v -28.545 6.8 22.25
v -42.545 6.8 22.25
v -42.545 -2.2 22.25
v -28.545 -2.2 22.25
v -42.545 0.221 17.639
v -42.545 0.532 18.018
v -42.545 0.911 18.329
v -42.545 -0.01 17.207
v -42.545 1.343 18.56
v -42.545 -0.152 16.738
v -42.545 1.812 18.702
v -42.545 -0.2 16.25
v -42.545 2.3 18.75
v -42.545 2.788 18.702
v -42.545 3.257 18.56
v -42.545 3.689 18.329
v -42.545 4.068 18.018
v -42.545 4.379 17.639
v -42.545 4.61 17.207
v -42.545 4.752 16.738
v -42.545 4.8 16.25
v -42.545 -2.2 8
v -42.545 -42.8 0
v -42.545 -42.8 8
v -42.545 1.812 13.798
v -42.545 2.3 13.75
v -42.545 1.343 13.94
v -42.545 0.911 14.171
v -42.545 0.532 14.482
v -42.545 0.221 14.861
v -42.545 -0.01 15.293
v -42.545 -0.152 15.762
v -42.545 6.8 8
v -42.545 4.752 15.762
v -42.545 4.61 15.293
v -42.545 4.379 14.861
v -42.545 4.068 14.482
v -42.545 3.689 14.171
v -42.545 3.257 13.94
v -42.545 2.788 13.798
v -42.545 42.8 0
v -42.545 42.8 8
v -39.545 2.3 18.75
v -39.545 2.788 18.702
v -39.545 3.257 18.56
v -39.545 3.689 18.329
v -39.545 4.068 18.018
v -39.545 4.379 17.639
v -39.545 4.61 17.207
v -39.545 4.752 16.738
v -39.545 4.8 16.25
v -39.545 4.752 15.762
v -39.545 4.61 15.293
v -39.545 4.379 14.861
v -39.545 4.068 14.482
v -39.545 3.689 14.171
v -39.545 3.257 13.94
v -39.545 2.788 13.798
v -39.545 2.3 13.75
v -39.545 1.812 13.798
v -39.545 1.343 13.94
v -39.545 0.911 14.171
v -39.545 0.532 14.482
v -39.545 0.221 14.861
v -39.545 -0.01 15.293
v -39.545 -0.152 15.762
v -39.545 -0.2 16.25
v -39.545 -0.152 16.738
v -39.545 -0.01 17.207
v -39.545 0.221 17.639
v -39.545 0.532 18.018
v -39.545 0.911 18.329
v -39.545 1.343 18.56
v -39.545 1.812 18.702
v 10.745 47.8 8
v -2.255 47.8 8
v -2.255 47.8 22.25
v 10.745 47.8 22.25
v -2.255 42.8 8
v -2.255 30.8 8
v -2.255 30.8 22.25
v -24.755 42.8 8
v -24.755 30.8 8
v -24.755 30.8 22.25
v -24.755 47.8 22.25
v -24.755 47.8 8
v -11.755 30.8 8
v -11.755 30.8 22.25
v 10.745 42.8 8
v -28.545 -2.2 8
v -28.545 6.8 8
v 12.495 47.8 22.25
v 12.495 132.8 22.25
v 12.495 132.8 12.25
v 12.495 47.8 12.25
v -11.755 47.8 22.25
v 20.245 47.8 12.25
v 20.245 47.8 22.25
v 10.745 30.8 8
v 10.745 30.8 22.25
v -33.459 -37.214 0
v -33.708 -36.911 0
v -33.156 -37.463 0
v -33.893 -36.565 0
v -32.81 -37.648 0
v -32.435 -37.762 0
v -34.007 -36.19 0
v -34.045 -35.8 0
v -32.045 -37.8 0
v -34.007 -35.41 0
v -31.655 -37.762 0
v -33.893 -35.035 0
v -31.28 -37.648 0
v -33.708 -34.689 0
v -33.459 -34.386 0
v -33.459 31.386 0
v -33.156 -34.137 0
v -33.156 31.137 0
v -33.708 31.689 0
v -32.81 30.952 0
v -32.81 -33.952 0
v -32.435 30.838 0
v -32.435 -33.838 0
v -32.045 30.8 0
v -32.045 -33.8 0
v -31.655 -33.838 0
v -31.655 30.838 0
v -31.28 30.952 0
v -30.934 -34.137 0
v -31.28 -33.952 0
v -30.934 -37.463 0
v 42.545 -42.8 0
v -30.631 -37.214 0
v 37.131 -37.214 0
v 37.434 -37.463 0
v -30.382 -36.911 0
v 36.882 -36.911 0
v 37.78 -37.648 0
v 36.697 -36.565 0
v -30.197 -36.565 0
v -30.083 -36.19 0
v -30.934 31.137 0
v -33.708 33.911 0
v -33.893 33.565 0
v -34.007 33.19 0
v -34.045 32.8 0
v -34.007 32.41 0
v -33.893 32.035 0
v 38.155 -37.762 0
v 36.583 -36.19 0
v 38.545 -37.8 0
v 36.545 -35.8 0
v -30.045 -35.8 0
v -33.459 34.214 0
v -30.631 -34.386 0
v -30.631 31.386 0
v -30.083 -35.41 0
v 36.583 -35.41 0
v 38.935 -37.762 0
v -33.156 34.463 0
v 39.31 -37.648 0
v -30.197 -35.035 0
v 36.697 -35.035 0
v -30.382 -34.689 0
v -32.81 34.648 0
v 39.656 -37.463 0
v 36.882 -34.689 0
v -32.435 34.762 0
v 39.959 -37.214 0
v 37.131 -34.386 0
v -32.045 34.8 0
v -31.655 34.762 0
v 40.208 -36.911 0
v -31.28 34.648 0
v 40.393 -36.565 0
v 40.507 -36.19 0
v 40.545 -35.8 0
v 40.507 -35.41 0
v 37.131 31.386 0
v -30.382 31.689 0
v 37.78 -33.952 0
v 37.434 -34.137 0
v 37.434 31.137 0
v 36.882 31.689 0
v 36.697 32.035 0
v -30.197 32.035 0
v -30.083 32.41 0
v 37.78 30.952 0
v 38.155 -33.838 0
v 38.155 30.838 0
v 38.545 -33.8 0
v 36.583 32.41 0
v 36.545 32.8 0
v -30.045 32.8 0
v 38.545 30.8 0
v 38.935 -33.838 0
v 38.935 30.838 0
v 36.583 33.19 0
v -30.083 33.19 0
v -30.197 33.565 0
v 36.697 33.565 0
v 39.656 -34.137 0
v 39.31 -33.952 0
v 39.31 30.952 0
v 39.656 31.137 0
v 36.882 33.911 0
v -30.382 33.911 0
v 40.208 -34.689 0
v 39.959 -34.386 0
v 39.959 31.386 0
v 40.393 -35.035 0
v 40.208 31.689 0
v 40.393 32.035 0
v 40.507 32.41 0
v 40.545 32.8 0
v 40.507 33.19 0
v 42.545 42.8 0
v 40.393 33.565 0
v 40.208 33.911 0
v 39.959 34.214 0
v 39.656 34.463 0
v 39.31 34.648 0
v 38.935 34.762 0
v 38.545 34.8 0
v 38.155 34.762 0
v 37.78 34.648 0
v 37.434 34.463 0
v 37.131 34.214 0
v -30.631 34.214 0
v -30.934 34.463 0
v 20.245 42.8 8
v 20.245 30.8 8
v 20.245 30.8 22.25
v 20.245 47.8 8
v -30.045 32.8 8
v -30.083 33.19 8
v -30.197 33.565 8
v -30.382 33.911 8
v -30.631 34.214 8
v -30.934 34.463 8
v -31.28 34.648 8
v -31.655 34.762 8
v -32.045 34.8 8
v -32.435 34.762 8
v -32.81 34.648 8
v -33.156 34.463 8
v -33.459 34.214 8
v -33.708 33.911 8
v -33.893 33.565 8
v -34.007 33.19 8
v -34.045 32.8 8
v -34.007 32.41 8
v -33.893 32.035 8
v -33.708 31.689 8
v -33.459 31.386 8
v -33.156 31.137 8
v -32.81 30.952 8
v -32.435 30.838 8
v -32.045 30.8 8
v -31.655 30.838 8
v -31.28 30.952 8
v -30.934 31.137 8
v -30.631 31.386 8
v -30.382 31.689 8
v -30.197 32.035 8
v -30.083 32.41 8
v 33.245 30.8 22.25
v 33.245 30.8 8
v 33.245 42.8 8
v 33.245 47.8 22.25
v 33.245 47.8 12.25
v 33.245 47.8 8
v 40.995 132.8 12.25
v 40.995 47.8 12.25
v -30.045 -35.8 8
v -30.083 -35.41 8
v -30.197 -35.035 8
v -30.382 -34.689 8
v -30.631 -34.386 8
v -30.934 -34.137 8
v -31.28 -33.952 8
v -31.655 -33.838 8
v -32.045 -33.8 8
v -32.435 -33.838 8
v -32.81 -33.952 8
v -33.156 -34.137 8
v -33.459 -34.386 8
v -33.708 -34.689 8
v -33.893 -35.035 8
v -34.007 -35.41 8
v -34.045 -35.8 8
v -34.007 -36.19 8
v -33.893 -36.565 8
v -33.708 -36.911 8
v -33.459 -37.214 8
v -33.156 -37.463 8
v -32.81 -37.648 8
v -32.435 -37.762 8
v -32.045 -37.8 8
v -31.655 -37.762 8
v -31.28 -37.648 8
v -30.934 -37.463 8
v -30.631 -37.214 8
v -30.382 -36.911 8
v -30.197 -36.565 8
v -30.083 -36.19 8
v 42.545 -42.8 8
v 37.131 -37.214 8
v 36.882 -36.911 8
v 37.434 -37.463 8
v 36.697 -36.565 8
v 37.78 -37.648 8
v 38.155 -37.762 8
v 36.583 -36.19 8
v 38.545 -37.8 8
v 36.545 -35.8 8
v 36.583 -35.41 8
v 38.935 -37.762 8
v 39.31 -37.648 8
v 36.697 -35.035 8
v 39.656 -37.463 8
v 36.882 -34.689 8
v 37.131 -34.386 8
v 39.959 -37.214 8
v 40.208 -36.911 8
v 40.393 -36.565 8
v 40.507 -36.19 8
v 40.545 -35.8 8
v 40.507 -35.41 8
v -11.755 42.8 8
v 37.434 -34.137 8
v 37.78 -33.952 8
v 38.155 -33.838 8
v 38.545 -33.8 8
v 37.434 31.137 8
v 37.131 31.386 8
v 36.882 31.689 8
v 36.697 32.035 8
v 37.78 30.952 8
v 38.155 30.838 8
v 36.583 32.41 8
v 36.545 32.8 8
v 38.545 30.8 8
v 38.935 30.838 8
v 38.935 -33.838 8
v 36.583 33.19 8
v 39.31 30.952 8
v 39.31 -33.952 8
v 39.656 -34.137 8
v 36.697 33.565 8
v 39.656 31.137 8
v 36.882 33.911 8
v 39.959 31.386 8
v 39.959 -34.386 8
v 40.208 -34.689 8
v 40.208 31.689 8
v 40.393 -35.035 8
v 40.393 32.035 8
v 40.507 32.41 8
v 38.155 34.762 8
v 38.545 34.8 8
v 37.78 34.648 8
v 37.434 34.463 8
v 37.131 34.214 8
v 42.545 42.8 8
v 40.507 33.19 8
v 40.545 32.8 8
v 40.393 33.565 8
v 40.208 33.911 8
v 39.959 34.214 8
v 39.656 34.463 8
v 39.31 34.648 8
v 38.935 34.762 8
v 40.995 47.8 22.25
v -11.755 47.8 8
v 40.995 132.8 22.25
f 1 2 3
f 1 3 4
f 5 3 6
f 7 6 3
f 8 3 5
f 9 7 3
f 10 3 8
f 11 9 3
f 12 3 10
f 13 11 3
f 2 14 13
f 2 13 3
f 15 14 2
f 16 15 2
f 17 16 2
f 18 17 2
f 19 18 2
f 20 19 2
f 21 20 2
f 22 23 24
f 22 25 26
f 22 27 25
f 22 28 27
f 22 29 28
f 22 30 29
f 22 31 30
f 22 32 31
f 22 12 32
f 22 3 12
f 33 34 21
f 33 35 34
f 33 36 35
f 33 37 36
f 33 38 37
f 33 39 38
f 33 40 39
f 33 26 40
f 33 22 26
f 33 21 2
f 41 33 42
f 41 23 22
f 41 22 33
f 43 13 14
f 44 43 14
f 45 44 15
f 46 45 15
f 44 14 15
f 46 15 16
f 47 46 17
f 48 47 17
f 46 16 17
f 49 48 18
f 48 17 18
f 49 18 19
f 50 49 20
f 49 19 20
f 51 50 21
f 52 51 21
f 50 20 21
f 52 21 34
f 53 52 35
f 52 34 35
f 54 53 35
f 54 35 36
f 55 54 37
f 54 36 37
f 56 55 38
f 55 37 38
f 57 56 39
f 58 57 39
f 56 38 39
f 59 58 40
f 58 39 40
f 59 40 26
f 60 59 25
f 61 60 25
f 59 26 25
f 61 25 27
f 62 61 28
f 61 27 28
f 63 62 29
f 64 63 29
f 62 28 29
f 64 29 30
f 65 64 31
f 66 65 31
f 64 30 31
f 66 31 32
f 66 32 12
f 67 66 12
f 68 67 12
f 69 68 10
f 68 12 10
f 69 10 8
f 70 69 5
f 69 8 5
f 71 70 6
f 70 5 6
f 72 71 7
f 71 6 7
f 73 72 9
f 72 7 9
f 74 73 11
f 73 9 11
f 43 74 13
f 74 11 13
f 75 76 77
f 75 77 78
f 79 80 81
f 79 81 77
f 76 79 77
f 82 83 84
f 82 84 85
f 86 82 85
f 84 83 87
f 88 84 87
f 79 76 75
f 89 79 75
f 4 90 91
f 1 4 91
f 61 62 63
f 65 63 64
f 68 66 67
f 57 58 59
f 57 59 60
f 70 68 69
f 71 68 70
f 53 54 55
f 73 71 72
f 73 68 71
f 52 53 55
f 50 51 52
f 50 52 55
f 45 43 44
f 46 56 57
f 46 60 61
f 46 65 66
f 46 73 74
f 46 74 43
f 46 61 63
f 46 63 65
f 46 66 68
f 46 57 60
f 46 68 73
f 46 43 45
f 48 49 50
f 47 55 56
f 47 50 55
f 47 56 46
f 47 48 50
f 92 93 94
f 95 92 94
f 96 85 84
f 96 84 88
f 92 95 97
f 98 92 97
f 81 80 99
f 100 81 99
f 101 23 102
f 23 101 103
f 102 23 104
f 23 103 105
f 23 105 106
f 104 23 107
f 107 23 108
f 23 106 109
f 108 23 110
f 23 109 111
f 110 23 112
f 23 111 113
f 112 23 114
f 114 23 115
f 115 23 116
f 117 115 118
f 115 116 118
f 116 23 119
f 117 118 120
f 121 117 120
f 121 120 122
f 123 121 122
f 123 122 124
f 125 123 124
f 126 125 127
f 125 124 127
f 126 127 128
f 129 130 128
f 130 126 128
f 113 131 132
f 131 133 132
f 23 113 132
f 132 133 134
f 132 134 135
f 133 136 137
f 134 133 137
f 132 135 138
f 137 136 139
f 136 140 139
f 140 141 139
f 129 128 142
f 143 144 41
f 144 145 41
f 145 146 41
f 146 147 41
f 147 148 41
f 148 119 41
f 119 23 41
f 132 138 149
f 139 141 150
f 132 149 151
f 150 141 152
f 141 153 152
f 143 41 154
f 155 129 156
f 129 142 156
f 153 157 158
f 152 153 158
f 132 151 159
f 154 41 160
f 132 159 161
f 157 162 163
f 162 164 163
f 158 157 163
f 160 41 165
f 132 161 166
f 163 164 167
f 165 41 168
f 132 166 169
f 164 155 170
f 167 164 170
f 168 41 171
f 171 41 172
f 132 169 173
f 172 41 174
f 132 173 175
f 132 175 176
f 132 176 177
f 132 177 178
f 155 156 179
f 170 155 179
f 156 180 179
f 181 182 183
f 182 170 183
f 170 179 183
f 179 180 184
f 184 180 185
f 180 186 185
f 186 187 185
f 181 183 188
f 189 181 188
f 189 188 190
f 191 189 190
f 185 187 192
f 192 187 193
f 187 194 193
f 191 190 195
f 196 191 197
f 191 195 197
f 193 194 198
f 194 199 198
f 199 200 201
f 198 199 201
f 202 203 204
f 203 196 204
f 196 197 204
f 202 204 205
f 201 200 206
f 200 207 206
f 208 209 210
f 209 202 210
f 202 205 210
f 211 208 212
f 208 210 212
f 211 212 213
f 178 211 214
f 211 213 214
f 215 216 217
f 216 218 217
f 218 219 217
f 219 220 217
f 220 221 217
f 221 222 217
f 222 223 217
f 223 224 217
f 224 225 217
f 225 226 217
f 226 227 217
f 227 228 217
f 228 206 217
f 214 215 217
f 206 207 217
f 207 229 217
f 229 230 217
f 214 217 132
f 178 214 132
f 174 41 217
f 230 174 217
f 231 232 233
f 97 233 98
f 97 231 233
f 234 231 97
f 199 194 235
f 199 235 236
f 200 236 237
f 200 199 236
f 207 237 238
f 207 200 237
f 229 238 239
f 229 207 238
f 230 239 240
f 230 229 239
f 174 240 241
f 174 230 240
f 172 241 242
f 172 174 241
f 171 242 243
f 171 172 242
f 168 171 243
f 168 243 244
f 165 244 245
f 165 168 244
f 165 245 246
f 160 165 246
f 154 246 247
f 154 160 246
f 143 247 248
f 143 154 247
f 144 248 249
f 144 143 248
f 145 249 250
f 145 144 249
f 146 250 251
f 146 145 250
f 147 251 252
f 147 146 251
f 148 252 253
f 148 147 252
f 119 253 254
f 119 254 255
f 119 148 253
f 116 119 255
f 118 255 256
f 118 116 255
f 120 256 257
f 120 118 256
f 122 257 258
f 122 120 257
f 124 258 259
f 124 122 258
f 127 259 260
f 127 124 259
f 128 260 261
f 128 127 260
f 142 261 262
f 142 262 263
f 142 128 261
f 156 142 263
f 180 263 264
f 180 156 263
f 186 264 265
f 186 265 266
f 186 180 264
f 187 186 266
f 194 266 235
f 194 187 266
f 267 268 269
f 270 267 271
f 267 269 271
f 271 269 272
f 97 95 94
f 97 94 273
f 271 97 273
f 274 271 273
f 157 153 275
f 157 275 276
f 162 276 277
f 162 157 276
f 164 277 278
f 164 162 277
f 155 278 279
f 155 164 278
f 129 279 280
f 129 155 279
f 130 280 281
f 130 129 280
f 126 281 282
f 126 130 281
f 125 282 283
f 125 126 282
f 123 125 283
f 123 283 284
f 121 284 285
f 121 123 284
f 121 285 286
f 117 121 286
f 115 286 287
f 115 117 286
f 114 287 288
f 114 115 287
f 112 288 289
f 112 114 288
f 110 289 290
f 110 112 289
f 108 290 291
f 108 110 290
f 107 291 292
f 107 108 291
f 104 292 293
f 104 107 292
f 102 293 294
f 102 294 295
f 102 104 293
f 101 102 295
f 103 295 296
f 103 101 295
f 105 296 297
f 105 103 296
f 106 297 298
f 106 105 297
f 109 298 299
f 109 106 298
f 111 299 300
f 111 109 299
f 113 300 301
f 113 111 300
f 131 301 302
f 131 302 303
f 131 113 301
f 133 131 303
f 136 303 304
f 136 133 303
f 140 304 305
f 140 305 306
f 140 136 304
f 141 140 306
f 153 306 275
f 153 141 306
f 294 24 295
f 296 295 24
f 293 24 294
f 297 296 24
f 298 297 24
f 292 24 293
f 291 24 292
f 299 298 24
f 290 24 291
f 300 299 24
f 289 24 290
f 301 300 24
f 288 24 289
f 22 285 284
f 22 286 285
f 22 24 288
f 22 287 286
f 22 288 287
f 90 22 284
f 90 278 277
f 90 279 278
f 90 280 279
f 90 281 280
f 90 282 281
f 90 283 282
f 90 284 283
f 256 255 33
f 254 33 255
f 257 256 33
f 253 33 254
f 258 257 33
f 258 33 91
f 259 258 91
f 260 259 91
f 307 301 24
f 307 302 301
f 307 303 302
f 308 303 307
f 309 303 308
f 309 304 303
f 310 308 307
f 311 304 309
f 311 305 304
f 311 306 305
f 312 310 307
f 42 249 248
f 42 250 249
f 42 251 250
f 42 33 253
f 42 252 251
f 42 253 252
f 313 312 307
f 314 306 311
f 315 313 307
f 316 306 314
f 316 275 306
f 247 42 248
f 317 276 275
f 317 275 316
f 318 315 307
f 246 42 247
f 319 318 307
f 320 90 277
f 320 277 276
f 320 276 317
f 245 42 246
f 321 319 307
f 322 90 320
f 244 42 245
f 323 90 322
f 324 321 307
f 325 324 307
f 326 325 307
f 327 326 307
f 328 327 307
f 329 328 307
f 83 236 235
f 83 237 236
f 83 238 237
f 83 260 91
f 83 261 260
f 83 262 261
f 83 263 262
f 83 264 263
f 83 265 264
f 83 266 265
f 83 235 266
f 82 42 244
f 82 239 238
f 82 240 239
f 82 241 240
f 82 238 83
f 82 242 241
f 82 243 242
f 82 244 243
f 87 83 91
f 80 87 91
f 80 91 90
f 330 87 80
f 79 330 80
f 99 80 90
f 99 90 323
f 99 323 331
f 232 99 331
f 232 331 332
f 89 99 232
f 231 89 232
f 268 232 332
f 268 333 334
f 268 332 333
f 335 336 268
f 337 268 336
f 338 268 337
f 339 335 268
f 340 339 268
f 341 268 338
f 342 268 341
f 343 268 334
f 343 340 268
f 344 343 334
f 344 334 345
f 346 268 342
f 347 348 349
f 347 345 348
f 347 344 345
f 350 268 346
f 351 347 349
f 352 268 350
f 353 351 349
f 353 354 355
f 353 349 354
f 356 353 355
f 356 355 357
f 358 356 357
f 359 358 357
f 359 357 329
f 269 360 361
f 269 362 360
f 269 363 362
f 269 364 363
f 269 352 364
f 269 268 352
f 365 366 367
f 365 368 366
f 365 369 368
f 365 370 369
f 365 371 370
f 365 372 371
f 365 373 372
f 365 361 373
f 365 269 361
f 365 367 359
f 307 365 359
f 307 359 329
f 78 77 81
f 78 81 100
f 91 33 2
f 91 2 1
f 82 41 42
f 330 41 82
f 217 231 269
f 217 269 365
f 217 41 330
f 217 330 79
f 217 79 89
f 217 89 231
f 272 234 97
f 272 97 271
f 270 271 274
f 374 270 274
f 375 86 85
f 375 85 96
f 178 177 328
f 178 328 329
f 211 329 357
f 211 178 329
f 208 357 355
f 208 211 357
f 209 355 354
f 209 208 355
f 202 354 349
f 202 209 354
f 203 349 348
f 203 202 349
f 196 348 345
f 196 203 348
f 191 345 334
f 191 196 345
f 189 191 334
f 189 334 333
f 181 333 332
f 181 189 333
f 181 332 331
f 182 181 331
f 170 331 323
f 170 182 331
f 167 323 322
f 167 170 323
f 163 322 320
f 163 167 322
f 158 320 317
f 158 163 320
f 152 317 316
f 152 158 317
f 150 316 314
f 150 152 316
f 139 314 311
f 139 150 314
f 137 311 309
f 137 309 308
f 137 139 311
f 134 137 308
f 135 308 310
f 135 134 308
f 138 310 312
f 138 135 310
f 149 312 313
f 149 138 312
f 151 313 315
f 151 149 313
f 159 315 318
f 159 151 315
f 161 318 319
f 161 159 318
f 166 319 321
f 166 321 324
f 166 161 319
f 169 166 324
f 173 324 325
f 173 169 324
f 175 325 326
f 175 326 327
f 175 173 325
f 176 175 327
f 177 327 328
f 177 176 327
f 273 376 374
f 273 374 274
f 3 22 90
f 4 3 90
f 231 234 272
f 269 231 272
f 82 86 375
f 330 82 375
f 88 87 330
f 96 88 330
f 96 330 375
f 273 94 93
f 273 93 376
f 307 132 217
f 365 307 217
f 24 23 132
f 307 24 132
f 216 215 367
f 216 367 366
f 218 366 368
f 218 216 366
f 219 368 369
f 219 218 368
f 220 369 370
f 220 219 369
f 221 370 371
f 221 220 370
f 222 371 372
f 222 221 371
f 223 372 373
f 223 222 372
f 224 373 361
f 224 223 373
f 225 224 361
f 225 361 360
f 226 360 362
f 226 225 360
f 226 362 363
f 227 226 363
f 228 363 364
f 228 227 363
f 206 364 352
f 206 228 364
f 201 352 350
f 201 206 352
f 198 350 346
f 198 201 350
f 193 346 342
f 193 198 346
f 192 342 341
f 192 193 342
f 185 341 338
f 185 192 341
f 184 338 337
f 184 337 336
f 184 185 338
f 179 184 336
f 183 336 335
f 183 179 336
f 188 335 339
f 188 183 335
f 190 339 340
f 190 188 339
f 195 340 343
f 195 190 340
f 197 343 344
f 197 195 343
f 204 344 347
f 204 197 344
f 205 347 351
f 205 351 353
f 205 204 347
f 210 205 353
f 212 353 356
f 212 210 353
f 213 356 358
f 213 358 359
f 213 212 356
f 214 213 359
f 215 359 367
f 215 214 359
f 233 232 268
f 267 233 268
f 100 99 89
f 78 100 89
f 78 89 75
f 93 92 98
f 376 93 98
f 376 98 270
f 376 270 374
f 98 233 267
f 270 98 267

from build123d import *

# Parameters (mm, degrees)
SKETCH1_W           = 85.09
SKETCH1_H           = 85.6
SKETCH1_R           = 2
BOSS_EXTRUDE1_DEPTH = 8
SKETCH2_W           = 13
SKETCH2_H           = 17
SKETCH2_W_2         = 14
SKETCH2_H_2         = 9
BOSS_EXTRUDE2_DEPTH = 14.25
SKETCH3_R           = 2.5
CUT_EXTRUDE1_DEPTH  = 3
SKETCH4_W           = 28.5
SKETCH4_H           = 10
BOSS_EXTRUDE3_DEPTH = 85


with BuildPart() as part:
    # Sketch1 → Boss-Extrude1 (new body)
    with BuildSketch(Plane.XY):
        Rectangle(SKETCH1_W, SKETCH1_H)
        with Locations((-32.045, 32.8)):
            Circle(SKETCH1_R, mode=Mode.SUBTRACT)
        with Locations((38.545, 32.8)):
            Circle(SKETCH1_R, mode=Mode.SUBTRACT)
        with Locations((38.545, -35.8)):
            Circle(SKETCH1_R, mode=Mode.SUBTRACT)
        with Locations((-32.045, -35.8)):
            Circle(SKETCH1_R, mode=Mode.SUBTRACT)
    extrude(amount=BOSS_EXTRUDE1_DEPTH)

    # Sketch2 → Boss-Extrude2 (add)
    with BuildSketch(Plane.XY.offset(8)):
        with Locations((26.745, 39.3)):
            Rectangle(SKETCH2_W, SKETCH2_H)
        with Locations((4.245, 39.3)):
            Rectangle(SKETCH2_W, SKETCH2_H)
        with Locations((-18.255, 39.3)):
            Rectangle(SKETCH2_W, SKETCH2_H)
        with Locations((-35.545, 2.3)):
            Rectangle(SKETCH2_W_2, SKETCH2_H_2)
    extrude(amount=BOSS_EXTRUDE2_DEPTH)

    # Sketch3 → Cut-Extrude1 (cut)
    with BuildSketch(Plane.ZY.offset(42.545)):
        with Locations((16.25, 2.3)):
            Circle(SKETCH3_R)
    extrude(amount=-CUT_EXTRUDE1_DEPTH, mode=Mode.SUBTRACT)

    # Sketch4 → Boss-Extrude3 (add)
    with BuildSketch(Plane(origin=(0, 47.8, 0), x_dir=(1, 0, 0), z_dir=(0, 1, 0))):
        with Locations((26.745, -17.25)):
            Rectangle(SKETCH4_W, SKETCH4_H)
    extrude(amount=BOSS_EXTRUDE3_DEPTH)


solid = part.part
